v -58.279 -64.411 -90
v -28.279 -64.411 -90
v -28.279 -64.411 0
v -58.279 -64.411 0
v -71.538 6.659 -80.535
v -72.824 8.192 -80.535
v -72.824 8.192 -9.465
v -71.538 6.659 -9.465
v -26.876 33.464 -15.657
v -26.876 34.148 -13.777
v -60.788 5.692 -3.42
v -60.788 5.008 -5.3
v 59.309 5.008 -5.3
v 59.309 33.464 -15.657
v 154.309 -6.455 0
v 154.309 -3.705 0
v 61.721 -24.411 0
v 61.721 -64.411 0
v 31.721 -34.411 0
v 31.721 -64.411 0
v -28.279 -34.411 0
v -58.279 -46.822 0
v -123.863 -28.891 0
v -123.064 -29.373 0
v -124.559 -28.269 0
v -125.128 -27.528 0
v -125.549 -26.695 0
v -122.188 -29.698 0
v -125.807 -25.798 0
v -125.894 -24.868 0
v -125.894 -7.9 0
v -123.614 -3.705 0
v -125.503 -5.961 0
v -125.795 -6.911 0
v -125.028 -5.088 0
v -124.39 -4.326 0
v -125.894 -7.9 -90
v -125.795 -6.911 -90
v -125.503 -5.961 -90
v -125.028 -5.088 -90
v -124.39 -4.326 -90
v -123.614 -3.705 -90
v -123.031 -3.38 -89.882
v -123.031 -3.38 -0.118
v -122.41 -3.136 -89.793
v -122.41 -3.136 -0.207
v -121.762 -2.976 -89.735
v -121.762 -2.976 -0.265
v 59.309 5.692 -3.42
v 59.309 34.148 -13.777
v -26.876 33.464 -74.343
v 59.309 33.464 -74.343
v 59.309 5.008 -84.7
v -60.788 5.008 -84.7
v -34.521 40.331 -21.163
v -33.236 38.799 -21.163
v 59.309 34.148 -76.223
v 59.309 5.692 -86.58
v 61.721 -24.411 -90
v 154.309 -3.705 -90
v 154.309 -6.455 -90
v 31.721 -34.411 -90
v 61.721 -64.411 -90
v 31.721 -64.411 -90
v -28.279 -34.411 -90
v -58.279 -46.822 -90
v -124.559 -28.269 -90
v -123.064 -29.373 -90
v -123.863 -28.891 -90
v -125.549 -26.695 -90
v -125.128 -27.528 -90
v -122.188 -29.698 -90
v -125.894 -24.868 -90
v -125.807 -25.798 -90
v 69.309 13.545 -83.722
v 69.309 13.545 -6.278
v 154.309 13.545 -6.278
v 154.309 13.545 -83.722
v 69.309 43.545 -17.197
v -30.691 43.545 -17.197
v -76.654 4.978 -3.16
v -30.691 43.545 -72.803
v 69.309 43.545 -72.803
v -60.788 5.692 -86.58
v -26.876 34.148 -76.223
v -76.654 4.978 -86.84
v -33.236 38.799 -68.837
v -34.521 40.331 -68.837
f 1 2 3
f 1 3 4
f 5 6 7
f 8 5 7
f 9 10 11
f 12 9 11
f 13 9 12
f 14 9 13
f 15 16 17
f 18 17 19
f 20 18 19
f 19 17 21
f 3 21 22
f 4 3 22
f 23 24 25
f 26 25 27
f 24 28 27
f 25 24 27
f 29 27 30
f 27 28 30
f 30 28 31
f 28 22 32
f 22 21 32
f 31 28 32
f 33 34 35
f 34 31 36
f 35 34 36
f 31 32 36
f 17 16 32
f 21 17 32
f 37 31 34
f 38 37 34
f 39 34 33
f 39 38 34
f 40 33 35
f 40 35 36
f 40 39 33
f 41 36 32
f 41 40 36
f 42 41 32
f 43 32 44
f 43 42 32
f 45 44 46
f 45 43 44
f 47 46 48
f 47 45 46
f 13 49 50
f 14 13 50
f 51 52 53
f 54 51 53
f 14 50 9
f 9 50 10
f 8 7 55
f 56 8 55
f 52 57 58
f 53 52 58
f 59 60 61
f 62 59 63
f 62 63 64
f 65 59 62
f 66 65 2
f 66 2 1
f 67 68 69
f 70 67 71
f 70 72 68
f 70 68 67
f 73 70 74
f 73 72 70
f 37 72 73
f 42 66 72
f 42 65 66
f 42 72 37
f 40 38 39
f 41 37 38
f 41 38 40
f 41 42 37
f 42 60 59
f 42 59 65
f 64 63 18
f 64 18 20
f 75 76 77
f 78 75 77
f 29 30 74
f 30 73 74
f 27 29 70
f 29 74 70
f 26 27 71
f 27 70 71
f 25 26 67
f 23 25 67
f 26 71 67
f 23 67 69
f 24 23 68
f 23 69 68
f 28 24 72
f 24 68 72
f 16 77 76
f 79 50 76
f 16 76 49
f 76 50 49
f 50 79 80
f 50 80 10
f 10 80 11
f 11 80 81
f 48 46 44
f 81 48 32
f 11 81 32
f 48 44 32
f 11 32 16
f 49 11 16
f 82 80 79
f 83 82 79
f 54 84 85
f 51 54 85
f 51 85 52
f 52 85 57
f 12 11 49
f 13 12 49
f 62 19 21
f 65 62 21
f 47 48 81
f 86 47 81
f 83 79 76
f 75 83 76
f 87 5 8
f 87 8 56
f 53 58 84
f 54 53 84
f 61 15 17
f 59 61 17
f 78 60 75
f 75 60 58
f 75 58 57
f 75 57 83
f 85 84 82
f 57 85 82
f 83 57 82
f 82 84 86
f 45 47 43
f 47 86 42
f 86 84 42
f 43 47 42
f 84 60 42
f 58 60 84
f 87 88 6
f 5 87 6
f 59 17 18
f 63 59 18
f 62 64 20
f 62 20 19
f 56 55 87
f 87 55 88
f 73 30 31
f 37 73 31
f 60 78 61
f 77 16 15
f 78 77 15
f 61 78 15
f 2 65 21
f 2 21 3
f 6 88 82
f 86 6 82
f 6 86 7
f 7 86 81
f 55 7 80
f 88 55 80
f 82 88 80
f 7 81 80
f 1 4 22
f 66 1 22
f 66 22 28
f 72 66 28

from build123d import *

# Parameters (mm, degrees)
BOSS_EXTRUDE1_DEPTH = 90
CUT_EXTRUDE1_DEPTH  = 337
CUT_EXTRUDE3_DEPTH  = 2
CUT_EXTRUDE4_DEPTH  = 2
CUT_EXTRUDE5_DEPTH  = 2
FILLET1_R           = 5


with BuildPart() as part:
    # Sketch1 → Boss-Extrude1 (new body)
    with BuildSketch(Plane.XY):
        Polygon((-125.894137159, -28.704779811), (-125.894137159, -3.704779811), (-76.653749508, 4.977629073), (-30.691082921, 43.544885654), (69.308917079, 43.544885654), (69.308917079, 13.544885654), (154.308917079, 13.544885654), (154.308917079, -6.455114346), (61.720670681, -24.411045774), (61.720670681, -64.411045774), (31.720670681, -64.411045774), (31.720670681, -34.411045774), (-28.279329319, -34.411045774), (-28.279329319, -64.411045774), (-58.279329319, -64.411045774), (-58.279329319, -46.822112968), align=None)
    extrude(amount=-BOSS_EXTRUDE1_DEPTH)

    # Sketch2 → Cut-Extrude1 (cut)
    with BuildSketch(Plane.ZY.offset(125.894137159)):
        Polygon((-45, 119.931704065), (0, -3.704779811), (0, 165.601573034), (-28.377527092, 165.601573034), align=None)
        Polygon((-90, -3.704779811), (-45, 119.931704065), (-61.622472908, 165.601573034), (-90, 165.601573034), align=None)
    extrude(amount=-CUT_EXTRUDE1_DEPTH, mode=Mode.SUBTRACT)

    # Sketch4 → Cut-Extrude3 (cut)
    with BuildSketch(Plane(origin=(0, -0.433376912, -1.190693279), x_dir=(1, 0, 0), z_dir=(0, 0.34202014332566305, 0.9396926207859105))):
        Polygon((-60.788441179, 6.51864575), (59.308917079, 6.51864575), (59.308917079, 36.800689495), (-26.876123748, 36.800689495), align=None)
    extrude(amount=-CUT_EXTRUDE3_DEPTH, mode=Mode.SUBTRACT)

    # Sketch5 → Cut-Extrude4 (cut)
    with BuildSketch(Plane(origin=(-34.122486649, 40.665596052, 0), x_dir=(0.766044443118979, 0.6427876096865383, 0), z_dir=(-0.6427876096865383, 0.766044443118979, 0))):
        Polygon((-50.520620561, 80.535068722), (-50.520620561, 9.464931278), (-0.520620561, 21.162709123), (-0.520620561, 68.837290877), align=None)
    extrude(amount=-CUT_EXTRUDE4_DEPTH, mode=Mode.SUBTRACT)

    # Sketch7 → Cut-Extrude5 (cut)
    with BuildSketch(Plane(origin=(0, 28.492065524, -78.281306661), x_dir=(-1, 0, 0), z_dir=(0, 0.34202014332566305, -0.9396926207859105))):
        Polygon((60.788441179, -24.263167149), (26.876123748, 6.018876595), (-59.308917079, 6.018876595), (-59.308917079, -24.263167149), align=None)
    extrude(amount=-CUT_EXTRUDE5_DEPTH, mode=Mode.SUBTRACT)

    # Fillet1
    fillet1_edges = [part.edges().sort_by_distance(p)[0] for p in [
        (-125.894137159, -28.704779811, -45),
        (-125.894137159, -3.704779811, -45),
    ]]
    fillet(fillet1_edges, radius=FILLET1_R)


solid = part.part
